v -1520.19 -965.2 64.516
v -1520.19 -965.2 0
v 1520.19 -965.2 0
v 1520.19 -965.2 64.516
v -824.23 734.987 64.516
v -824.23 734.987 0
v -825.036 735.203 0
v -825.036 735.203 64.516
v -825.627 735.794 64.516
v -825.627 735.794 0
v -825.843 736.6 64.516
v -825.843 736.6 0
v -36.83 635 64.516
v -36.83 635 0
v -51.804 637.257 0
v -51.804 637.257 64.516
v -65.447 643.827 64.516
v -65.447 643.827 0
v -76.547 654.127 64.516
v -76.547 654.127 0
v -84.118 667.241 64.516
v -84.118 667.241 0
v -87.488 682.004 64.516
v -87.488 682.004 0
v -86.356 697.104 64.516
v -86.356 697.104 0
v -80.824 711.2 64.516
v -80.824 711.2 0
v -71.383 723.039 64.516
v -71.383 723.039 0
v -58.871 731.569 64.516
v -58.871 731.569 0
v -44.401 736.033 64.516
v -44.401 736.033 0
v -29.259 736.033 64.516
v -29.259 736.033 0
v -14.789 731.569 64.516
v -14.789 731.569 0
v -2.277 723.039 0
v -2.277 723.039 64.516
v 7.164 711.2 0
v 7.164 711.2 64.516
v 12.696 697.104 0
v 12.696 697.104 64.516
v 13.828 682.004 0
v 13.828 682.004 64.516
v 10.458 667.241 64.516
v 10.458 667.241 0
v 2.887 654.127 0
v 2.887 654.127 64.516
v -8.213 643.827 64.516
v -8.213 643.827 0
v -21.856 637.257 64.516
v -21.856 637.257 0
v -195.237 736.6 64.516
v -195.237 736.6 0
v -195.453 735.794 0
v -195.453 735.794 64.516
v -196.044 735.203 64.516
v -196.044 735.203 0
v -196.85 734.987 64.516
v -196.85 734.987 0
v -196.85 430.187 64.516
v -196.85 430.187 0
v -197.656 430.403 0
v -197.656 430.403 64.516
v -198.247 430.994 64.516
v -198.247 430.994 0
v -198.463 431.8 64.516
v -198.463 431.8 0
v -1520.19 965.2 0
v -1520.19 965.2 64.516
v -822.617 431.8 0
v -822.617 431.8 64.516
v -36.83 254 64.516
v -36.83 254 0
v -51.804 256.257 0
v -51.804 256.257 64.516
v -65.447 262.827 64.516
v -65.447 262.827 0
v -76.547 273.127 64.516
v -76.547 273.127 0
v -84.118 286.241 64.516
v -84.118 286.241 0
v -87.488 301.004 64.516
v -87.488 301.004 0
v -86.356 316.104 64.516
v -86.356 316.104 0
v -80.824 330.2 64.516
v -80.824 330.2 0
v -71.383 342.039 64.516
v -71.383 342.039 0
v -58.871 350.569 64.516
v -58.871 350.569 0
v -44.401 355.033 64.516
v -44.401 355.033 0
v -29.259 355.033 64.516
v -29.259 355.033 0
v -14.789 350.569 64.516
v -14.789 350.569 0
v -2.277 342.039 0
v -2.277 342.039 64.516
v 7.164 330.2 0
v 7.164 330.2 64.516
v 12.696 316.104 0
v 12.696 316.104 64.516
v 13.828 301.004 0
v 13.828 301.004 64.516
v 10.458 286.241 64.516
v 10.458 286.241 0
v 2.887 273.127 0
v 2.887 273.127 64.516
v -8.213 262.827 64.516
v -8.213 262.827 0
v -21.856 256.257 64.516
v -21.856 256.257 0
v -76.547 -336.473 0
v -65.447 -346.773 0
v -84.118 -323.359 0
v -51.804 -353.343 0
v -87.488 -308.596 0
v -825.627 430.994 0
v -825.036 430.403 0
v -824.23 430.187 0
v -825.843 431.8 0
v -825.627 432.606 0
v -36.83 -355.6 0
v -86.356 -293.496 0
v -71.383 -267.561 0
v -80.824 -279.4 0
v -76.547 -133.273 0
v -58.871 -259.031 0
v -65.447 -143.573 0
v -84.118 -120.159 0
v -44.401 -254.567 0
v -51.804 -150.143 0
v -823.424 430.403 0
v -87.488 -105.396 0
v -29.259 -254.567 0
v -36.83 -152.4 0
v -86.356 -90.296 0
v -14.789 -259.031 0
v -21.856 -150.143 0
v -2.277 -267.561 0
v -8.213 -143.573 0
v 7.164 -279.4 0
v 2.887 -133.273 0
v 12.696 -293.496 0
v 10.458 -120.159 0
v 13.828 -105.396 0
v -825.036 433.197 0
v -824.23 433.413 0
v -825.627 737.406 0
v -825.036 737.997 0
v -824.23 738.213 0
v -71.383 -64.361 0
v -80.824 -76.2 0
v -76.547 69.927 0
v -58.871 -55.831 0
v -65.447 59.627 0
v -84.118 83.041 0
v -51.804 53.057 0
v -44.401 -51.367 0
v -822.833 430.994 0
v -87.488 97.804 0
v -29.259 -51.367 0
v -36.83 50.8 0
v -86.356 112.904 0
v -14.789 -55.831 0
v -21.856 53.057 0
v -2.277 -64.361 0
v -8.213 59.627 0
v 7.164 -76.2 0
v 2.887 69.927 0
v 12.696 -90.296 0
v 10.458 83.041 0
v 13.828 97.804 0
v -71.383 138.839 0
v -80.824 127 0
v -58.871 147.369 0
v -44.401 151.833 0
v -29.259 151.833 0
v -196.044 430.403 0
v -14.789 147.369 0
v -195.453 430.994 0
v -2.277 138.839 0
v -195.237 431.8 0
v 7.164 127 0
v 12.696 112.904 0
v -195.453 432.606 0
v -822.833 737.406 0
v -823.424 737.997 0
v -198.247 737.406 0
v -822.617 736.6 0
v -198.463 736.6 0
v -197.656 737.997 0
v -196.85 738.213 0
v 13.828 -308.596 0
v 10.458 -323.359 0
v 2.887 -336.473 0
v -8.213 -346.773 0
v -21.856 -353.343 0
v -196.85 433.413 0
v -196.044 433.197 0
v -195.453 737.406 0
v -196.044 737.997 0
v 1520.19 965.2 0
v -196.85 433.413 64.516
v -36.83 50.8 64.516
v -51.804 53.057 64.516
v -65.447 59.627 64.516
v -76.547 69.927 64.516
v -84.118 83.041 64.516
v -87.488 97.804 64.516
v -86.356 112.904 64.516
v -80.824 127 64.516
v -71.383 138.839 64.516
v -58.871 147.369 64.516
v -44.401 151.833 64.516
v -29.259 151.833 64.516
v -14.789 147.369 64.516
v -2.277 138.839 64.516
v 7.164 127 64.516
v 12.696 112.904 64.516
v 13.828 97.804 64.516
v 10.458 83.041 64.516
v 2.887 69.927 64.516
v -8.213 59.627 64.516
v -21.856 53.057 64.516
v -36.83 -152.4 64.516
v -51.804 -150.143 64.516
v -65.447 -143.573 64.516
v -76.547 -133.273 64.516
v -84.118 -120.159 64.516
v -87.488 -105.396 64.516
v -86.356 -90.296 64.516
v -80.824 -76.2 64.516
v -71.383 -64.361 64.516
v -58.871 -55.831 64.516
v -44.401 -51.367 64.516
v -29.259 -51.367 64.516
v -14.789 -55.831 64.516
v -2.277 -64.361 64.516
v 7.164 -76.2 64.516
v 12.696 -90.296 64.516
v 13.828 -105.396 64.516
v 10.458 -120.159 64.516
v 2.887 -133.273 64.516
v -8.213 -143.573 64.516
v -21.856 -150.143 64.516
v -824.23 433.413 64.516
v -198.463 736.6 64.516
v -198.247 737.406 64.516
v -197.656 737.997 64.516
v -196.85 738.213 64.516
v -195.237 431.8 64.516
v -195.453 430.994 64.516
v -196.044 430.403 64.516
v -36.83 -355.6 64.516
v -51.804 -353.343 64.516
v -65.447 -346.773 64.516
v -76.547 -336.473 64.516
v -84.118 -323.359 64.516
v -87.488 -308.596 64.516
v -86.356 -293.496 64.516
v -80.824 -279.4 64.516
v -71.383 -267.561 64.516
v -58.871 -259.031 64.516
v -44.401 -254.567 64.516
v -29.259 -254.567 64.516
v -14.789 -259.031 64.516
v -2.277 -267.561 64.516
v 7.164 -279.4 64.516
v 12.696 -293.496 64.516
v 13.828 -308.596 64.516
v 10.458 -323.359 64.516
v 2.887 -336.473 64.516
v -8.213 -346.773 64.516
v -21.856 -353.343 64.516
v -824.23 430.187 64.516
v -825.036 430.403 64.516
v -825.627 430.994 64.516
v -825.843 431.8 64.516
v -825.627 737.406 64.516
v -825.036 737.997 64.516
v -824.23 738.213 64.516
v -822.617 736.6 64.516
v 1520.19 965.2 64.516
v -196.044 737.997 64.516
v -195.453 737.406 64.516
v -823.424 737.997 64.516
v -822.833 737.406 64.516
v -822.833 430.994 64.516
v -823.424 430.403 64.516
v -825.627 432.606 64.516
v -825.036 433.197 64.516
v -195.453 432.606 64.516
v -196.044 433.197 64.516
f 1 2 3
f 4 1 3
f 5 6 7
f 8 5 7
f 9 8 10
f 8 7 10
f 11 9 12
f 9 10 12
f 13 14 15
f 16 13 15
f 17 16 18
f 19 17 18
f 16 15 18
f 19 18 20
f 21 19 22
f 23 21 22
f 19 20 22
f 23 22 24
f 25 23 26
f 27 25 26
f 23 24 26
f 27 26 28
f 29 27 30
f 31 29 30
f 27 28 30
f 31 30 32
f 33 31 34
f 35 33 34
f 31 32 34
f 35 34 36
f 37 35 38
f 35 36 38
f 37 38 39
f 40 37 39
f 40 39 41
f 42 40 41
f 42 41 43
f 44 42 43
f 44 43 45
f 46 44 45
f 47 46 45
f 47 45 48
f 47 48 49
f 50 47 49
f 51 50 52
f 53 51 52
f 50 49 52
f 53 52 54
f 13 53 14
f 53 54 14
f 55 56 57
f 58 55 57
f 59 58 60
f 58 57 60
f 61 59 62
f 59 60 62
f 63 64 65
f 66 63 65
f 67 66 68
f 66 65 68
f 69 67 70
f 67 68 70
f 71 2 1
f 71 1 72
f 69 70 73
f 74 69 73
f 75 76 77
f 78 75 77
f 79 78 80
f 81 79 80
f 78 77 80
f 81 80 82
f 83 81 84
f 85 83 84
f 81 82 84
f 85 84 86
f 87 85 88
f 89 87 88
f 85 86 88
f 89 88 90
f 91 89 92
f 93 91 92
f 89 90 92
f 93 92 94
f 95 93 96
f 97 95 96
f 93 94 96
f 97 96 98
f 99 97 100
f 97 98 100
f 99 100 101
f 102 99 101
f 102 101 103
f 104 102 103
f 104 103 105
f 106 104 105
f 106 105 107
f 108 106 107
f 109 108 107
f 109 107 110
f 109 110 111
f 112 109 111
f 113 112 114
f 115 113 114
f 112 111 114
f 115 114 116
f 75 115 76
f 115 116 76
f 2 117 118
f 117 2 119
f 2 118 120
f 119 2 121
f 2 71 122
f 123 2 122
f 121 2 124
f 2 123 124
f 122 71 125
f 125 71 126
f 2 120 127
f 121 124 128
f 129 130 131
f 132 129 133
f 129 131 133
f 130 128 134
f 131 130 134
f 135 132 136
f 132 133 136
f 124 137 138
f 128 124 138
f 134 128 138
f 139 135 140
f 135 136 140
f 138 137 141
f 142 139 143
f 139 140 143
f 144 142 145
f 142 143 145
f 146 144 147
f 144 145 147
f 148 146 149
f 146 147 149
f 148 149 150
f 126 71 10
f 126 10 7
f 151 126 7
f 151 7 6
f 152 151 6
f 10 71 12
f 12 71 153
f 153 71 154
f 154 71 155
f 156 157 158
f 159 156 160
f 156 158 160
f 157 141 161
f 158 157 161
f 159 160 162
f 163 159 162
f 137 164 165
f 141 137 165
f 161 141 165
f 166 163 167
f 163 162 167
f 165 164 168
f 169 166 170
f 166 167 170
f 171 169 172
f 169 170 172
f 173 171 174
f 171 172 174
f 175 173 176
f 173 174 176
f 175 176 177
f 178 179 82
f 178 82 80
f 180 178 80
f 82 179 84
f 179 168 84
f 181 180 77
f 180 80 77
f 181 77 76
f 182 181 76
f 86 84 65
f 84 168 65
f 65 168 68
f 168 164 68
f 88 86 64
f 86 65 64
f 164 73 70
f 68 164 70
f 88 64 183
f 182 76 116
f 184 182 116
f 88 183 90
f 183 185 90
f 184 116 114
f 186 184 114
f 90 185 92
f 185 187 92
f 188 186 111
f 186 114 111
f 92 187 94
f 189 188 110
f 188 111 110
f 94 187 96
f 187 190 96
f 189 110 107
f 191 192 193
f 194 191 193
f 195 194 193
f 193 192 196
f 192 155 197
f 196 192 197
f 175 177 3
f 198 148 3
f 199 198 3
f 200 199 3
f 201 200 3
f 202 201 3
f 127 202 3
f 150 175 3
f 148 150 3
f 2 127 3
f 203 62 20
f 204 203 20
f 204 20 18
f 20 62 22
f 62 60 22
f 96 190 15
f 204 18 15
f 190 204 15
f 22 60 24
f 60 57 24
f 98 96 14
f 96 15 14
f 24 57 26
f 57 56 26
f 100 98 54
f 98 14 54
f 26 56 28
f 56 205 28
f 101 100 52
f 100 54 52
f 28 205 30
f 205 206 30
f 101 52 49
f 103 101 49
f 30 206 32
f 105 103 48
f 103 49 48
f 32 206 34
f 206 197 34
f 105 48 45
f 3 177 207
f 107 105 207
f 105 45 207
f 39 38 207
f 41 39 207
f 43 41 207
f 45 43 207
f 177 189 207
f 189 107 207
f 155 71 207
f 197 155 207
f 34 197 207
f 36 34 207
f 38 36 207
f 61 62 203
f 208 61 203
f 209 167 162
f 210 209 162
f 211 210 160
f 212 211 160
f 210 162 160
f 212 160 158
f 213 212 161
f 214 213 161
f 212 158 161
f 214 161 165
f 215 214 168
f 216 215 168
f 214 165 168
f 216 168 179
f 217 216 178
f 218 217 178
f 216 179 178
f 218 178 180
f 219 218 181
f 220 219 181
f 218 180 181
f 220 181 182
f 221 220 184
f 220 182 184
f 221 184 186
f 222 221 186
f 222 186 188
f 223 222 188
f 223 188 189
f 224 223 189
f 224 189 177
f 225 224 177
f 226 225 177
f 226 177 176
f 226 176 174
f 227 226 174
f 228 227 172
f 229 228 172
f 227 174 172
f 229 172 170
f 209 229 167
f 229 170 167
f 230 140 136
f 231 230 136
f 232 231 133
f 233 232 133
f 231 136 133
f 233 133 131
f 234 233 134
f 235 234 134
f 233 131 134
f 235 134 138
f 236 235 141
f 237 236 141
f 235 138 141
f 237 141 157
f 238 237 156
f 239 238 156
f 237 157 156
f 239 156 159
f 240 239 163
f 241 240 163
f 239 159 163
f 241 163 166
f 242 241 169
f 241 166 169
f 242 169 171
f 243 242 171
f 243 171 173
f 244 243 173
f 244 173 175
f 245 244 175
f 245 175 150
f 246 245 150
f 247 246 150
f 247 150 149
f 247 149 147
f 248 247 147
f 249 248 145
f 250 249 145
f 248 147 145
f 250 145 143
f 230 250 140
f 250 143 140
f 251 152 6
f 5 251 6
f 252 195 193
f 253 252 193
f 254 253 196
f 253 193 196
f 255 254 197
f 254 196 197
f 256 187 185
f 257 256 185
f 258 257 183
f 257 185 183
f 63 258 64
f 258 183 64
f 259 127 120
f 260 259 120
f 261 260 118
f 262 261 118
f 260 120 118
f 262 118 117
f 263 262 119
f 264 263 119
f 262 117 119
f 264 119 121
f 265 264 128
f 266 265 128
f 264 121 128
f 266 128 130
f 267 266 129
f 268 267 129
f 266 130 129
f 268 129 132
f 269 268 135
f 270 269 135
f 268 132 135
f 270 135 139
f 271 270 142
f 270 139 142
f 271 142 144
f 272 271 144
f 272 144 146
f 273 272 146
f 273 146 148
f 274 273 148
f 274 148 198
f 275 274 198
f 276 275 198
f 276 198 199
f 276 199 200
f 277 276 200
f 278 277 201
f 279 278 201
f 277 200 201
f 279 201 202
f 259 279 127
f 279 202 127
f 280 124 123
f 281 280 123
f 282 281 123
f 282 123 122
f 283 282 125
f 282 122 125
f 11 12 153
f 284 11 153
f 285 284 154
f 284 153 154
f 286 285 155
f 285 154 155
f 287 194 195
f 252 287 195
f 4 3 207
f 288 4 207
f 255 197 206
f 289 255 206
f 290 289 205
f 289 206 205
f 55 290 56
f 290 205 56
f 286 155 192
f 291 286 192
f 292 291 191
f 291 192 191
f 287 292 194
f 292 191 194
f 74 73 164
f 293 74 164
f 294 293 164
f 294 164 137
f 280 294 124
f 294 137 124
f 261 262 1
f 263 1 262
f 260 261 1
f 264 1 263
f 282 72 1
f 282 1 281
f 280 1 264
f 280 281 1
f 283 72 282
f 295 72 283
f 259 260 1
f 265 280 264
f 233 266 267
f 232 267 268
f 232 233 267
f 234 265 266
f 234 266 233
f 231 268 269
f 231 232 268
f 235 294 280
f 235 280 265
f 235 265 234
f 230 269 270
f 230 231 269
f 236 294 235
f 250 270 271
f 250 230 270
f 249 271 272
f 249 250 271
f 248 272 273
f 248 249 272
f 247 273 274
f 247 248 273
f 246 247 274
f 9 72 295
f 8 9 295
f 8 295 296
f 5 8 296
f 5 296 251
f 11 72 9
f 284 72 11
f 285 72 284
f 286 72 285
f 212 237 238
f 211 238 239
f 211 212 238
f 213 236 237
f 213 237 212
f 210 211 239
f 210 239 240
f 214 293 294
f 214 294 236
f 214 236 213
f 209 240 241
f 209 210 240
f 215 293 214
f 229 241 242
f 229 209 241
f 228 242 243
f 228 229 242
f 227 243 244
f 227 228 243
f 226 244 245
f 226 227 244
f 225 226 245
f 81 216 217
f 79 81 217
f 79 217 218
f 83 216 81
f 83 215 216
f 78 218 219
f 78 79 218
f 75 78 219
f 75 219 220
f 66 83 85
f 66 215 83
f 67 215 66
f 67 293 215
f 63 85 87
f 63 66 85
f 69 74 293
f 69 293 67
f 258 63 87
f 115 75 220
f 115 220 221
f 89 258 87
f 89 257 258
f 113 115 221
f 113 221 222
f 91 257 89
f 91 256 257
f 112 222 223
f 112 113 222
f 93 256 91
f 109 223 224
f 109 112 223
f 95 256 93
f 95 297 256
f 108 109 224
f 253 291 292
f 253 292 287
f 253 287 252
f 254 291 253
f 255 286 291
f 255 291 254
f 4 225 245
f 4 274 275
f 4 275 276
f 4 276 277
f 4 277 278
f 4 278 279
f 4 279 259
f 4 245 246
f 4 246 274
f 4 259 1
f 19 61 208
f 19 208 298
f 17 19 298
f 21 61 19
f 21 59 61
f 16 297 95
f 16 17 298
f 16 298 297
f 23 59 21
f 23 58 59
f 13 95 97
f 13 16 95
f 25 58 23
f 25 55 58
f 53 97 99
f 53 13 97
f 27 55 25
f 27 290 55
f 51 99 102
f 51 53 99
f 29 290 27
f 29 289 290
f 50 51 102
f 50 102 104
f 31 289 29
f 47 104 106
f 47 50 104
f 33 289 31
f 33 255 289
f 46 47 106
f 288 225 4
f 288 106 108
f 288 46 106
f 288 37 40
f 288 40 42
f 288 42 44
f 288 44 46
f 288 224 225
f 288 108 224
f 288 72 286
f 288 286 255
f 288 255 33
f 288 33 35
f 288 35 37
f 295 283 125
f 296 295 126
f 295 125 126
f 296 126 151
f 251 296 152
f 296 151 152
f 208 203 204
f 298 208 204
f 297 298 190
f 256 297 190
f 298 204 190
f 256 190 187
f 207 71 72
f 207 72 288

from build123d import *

# Parameters (mm, degrees)
F0_W     = 3040.38
F0_H     = 1930.4
F1_DEPTH = 64.516


with BuildPart() as f1:
    # F0 (on Top) → F1 (new body)
    with BuildSketch(Plane.XY):
        Rectangle(F0_W, F0_H)
        with BuildLine():
            ThreePointArc((-36.83, -254), (13.97, -304.8), (-36.83, -355.6))
            ThreePointArc((-36.83, -355.6), (-87.63, -304.8), (-36.83, -254))
        make_face(mode=Mode.SUBTRACT)
        with BuildLine():
            ThreePointArc((-36.83, -50.8), (13.97, -101.6), (-36.83, -152.4))
            ThreePointArc((-36.83, -152.4), (-87.63, -101.6), (-36.83, -50.8))
        make_face(mode=Mode.SUBTRACT)
        with BuildLine():
            ThreePointArc((-36.83, 152.4), (13.97, 101.6), (-36.83, 50.8))
            ThreePointArc((-36.83, 50.8), (-87.63, 101.6), (-36.83, 152.4))
        make_face(mode=Mode.SUBTRACT)
        with BuildLine():
            ThreePointArc((-36.83, 355.6), (13.97, 304.8), (-36.83, 254))
            ThreePointArc((-36.83, 254), (-87.63, 304.8), (-36.83, 355.6))
        make_face(mode=Mode.SUBTRACT)
        with BuildLine():
            ThreePointArc((-825.8429, 431.8), (-825.370493, 432.940493), (-824.23, 433.4129))
            Line((-824.23, 433.4129), (-824.23, 734.9871))
            ThreePointArc((-824.23, 734.9871), (-825.370493, 735.459507), (-825.8429, 736.6))
            ThreePointArc((-825.8429, 736.6), (-825.370493, 737.740493), (-824.23, 738.2129))
            ThreePointArc((-824.23, 738.2129), (-823.089507, 737.740493), (-822.6171, 736.6))
            Line((-822.6171, 736.6), (-198.4629, 736.6))
            ThreePointArc((-198.4629, 736.6), (-197.990493, 737.740493), (-196.85, 738.2129))
            ThreePointArc((-196.85, 738.2129), (-195.709507, 737.740493), (-195.2371, 736.6))
            ThreePointArc((-195.2371, 736.6), (-195.709507, 735.459507), (-196.85, 734.9871))
            Line((-196.85, 734.9871), (-196.85, 433.4129))
            ThreePointArc((-196.85, 433.4129), (-195.709507, 432.940493), (-195.2371, 431.8))
            ThreePointArc((-195.2371, 431.8), (-195.709507, 430.659507), (-196.85, 430.1871))
            ThreePointArc((-196.85, 430.1871), (-197.990493, 430.659507), (-198.4629, 431.8))
            Line((-198.4629, 431.8), (-822.6171, 431.8))
            ThreePointArc((-822.6171, 431.8), (-823.089507, 430.659507), (-824.23, 430.1871))
            ThreePointArc((-824.23, 430.1871), (-825.370493, 430.659507), (-825.8429, 431.8))
        make_face(mode=Mode.SUBTRACT)
        with BuildLine():
            ThreePointArc((-36.83, 736.6), (13.97, 685.8), (-36.83, 635))
            ThreePointArc((-36.83, 635), (-87.63, 685.8), (-36.83, 736.6))
        make_face(mode=Mode.SUBTRACT)
    extrude(amount=F1_DEPTH)


solid = f1.part
